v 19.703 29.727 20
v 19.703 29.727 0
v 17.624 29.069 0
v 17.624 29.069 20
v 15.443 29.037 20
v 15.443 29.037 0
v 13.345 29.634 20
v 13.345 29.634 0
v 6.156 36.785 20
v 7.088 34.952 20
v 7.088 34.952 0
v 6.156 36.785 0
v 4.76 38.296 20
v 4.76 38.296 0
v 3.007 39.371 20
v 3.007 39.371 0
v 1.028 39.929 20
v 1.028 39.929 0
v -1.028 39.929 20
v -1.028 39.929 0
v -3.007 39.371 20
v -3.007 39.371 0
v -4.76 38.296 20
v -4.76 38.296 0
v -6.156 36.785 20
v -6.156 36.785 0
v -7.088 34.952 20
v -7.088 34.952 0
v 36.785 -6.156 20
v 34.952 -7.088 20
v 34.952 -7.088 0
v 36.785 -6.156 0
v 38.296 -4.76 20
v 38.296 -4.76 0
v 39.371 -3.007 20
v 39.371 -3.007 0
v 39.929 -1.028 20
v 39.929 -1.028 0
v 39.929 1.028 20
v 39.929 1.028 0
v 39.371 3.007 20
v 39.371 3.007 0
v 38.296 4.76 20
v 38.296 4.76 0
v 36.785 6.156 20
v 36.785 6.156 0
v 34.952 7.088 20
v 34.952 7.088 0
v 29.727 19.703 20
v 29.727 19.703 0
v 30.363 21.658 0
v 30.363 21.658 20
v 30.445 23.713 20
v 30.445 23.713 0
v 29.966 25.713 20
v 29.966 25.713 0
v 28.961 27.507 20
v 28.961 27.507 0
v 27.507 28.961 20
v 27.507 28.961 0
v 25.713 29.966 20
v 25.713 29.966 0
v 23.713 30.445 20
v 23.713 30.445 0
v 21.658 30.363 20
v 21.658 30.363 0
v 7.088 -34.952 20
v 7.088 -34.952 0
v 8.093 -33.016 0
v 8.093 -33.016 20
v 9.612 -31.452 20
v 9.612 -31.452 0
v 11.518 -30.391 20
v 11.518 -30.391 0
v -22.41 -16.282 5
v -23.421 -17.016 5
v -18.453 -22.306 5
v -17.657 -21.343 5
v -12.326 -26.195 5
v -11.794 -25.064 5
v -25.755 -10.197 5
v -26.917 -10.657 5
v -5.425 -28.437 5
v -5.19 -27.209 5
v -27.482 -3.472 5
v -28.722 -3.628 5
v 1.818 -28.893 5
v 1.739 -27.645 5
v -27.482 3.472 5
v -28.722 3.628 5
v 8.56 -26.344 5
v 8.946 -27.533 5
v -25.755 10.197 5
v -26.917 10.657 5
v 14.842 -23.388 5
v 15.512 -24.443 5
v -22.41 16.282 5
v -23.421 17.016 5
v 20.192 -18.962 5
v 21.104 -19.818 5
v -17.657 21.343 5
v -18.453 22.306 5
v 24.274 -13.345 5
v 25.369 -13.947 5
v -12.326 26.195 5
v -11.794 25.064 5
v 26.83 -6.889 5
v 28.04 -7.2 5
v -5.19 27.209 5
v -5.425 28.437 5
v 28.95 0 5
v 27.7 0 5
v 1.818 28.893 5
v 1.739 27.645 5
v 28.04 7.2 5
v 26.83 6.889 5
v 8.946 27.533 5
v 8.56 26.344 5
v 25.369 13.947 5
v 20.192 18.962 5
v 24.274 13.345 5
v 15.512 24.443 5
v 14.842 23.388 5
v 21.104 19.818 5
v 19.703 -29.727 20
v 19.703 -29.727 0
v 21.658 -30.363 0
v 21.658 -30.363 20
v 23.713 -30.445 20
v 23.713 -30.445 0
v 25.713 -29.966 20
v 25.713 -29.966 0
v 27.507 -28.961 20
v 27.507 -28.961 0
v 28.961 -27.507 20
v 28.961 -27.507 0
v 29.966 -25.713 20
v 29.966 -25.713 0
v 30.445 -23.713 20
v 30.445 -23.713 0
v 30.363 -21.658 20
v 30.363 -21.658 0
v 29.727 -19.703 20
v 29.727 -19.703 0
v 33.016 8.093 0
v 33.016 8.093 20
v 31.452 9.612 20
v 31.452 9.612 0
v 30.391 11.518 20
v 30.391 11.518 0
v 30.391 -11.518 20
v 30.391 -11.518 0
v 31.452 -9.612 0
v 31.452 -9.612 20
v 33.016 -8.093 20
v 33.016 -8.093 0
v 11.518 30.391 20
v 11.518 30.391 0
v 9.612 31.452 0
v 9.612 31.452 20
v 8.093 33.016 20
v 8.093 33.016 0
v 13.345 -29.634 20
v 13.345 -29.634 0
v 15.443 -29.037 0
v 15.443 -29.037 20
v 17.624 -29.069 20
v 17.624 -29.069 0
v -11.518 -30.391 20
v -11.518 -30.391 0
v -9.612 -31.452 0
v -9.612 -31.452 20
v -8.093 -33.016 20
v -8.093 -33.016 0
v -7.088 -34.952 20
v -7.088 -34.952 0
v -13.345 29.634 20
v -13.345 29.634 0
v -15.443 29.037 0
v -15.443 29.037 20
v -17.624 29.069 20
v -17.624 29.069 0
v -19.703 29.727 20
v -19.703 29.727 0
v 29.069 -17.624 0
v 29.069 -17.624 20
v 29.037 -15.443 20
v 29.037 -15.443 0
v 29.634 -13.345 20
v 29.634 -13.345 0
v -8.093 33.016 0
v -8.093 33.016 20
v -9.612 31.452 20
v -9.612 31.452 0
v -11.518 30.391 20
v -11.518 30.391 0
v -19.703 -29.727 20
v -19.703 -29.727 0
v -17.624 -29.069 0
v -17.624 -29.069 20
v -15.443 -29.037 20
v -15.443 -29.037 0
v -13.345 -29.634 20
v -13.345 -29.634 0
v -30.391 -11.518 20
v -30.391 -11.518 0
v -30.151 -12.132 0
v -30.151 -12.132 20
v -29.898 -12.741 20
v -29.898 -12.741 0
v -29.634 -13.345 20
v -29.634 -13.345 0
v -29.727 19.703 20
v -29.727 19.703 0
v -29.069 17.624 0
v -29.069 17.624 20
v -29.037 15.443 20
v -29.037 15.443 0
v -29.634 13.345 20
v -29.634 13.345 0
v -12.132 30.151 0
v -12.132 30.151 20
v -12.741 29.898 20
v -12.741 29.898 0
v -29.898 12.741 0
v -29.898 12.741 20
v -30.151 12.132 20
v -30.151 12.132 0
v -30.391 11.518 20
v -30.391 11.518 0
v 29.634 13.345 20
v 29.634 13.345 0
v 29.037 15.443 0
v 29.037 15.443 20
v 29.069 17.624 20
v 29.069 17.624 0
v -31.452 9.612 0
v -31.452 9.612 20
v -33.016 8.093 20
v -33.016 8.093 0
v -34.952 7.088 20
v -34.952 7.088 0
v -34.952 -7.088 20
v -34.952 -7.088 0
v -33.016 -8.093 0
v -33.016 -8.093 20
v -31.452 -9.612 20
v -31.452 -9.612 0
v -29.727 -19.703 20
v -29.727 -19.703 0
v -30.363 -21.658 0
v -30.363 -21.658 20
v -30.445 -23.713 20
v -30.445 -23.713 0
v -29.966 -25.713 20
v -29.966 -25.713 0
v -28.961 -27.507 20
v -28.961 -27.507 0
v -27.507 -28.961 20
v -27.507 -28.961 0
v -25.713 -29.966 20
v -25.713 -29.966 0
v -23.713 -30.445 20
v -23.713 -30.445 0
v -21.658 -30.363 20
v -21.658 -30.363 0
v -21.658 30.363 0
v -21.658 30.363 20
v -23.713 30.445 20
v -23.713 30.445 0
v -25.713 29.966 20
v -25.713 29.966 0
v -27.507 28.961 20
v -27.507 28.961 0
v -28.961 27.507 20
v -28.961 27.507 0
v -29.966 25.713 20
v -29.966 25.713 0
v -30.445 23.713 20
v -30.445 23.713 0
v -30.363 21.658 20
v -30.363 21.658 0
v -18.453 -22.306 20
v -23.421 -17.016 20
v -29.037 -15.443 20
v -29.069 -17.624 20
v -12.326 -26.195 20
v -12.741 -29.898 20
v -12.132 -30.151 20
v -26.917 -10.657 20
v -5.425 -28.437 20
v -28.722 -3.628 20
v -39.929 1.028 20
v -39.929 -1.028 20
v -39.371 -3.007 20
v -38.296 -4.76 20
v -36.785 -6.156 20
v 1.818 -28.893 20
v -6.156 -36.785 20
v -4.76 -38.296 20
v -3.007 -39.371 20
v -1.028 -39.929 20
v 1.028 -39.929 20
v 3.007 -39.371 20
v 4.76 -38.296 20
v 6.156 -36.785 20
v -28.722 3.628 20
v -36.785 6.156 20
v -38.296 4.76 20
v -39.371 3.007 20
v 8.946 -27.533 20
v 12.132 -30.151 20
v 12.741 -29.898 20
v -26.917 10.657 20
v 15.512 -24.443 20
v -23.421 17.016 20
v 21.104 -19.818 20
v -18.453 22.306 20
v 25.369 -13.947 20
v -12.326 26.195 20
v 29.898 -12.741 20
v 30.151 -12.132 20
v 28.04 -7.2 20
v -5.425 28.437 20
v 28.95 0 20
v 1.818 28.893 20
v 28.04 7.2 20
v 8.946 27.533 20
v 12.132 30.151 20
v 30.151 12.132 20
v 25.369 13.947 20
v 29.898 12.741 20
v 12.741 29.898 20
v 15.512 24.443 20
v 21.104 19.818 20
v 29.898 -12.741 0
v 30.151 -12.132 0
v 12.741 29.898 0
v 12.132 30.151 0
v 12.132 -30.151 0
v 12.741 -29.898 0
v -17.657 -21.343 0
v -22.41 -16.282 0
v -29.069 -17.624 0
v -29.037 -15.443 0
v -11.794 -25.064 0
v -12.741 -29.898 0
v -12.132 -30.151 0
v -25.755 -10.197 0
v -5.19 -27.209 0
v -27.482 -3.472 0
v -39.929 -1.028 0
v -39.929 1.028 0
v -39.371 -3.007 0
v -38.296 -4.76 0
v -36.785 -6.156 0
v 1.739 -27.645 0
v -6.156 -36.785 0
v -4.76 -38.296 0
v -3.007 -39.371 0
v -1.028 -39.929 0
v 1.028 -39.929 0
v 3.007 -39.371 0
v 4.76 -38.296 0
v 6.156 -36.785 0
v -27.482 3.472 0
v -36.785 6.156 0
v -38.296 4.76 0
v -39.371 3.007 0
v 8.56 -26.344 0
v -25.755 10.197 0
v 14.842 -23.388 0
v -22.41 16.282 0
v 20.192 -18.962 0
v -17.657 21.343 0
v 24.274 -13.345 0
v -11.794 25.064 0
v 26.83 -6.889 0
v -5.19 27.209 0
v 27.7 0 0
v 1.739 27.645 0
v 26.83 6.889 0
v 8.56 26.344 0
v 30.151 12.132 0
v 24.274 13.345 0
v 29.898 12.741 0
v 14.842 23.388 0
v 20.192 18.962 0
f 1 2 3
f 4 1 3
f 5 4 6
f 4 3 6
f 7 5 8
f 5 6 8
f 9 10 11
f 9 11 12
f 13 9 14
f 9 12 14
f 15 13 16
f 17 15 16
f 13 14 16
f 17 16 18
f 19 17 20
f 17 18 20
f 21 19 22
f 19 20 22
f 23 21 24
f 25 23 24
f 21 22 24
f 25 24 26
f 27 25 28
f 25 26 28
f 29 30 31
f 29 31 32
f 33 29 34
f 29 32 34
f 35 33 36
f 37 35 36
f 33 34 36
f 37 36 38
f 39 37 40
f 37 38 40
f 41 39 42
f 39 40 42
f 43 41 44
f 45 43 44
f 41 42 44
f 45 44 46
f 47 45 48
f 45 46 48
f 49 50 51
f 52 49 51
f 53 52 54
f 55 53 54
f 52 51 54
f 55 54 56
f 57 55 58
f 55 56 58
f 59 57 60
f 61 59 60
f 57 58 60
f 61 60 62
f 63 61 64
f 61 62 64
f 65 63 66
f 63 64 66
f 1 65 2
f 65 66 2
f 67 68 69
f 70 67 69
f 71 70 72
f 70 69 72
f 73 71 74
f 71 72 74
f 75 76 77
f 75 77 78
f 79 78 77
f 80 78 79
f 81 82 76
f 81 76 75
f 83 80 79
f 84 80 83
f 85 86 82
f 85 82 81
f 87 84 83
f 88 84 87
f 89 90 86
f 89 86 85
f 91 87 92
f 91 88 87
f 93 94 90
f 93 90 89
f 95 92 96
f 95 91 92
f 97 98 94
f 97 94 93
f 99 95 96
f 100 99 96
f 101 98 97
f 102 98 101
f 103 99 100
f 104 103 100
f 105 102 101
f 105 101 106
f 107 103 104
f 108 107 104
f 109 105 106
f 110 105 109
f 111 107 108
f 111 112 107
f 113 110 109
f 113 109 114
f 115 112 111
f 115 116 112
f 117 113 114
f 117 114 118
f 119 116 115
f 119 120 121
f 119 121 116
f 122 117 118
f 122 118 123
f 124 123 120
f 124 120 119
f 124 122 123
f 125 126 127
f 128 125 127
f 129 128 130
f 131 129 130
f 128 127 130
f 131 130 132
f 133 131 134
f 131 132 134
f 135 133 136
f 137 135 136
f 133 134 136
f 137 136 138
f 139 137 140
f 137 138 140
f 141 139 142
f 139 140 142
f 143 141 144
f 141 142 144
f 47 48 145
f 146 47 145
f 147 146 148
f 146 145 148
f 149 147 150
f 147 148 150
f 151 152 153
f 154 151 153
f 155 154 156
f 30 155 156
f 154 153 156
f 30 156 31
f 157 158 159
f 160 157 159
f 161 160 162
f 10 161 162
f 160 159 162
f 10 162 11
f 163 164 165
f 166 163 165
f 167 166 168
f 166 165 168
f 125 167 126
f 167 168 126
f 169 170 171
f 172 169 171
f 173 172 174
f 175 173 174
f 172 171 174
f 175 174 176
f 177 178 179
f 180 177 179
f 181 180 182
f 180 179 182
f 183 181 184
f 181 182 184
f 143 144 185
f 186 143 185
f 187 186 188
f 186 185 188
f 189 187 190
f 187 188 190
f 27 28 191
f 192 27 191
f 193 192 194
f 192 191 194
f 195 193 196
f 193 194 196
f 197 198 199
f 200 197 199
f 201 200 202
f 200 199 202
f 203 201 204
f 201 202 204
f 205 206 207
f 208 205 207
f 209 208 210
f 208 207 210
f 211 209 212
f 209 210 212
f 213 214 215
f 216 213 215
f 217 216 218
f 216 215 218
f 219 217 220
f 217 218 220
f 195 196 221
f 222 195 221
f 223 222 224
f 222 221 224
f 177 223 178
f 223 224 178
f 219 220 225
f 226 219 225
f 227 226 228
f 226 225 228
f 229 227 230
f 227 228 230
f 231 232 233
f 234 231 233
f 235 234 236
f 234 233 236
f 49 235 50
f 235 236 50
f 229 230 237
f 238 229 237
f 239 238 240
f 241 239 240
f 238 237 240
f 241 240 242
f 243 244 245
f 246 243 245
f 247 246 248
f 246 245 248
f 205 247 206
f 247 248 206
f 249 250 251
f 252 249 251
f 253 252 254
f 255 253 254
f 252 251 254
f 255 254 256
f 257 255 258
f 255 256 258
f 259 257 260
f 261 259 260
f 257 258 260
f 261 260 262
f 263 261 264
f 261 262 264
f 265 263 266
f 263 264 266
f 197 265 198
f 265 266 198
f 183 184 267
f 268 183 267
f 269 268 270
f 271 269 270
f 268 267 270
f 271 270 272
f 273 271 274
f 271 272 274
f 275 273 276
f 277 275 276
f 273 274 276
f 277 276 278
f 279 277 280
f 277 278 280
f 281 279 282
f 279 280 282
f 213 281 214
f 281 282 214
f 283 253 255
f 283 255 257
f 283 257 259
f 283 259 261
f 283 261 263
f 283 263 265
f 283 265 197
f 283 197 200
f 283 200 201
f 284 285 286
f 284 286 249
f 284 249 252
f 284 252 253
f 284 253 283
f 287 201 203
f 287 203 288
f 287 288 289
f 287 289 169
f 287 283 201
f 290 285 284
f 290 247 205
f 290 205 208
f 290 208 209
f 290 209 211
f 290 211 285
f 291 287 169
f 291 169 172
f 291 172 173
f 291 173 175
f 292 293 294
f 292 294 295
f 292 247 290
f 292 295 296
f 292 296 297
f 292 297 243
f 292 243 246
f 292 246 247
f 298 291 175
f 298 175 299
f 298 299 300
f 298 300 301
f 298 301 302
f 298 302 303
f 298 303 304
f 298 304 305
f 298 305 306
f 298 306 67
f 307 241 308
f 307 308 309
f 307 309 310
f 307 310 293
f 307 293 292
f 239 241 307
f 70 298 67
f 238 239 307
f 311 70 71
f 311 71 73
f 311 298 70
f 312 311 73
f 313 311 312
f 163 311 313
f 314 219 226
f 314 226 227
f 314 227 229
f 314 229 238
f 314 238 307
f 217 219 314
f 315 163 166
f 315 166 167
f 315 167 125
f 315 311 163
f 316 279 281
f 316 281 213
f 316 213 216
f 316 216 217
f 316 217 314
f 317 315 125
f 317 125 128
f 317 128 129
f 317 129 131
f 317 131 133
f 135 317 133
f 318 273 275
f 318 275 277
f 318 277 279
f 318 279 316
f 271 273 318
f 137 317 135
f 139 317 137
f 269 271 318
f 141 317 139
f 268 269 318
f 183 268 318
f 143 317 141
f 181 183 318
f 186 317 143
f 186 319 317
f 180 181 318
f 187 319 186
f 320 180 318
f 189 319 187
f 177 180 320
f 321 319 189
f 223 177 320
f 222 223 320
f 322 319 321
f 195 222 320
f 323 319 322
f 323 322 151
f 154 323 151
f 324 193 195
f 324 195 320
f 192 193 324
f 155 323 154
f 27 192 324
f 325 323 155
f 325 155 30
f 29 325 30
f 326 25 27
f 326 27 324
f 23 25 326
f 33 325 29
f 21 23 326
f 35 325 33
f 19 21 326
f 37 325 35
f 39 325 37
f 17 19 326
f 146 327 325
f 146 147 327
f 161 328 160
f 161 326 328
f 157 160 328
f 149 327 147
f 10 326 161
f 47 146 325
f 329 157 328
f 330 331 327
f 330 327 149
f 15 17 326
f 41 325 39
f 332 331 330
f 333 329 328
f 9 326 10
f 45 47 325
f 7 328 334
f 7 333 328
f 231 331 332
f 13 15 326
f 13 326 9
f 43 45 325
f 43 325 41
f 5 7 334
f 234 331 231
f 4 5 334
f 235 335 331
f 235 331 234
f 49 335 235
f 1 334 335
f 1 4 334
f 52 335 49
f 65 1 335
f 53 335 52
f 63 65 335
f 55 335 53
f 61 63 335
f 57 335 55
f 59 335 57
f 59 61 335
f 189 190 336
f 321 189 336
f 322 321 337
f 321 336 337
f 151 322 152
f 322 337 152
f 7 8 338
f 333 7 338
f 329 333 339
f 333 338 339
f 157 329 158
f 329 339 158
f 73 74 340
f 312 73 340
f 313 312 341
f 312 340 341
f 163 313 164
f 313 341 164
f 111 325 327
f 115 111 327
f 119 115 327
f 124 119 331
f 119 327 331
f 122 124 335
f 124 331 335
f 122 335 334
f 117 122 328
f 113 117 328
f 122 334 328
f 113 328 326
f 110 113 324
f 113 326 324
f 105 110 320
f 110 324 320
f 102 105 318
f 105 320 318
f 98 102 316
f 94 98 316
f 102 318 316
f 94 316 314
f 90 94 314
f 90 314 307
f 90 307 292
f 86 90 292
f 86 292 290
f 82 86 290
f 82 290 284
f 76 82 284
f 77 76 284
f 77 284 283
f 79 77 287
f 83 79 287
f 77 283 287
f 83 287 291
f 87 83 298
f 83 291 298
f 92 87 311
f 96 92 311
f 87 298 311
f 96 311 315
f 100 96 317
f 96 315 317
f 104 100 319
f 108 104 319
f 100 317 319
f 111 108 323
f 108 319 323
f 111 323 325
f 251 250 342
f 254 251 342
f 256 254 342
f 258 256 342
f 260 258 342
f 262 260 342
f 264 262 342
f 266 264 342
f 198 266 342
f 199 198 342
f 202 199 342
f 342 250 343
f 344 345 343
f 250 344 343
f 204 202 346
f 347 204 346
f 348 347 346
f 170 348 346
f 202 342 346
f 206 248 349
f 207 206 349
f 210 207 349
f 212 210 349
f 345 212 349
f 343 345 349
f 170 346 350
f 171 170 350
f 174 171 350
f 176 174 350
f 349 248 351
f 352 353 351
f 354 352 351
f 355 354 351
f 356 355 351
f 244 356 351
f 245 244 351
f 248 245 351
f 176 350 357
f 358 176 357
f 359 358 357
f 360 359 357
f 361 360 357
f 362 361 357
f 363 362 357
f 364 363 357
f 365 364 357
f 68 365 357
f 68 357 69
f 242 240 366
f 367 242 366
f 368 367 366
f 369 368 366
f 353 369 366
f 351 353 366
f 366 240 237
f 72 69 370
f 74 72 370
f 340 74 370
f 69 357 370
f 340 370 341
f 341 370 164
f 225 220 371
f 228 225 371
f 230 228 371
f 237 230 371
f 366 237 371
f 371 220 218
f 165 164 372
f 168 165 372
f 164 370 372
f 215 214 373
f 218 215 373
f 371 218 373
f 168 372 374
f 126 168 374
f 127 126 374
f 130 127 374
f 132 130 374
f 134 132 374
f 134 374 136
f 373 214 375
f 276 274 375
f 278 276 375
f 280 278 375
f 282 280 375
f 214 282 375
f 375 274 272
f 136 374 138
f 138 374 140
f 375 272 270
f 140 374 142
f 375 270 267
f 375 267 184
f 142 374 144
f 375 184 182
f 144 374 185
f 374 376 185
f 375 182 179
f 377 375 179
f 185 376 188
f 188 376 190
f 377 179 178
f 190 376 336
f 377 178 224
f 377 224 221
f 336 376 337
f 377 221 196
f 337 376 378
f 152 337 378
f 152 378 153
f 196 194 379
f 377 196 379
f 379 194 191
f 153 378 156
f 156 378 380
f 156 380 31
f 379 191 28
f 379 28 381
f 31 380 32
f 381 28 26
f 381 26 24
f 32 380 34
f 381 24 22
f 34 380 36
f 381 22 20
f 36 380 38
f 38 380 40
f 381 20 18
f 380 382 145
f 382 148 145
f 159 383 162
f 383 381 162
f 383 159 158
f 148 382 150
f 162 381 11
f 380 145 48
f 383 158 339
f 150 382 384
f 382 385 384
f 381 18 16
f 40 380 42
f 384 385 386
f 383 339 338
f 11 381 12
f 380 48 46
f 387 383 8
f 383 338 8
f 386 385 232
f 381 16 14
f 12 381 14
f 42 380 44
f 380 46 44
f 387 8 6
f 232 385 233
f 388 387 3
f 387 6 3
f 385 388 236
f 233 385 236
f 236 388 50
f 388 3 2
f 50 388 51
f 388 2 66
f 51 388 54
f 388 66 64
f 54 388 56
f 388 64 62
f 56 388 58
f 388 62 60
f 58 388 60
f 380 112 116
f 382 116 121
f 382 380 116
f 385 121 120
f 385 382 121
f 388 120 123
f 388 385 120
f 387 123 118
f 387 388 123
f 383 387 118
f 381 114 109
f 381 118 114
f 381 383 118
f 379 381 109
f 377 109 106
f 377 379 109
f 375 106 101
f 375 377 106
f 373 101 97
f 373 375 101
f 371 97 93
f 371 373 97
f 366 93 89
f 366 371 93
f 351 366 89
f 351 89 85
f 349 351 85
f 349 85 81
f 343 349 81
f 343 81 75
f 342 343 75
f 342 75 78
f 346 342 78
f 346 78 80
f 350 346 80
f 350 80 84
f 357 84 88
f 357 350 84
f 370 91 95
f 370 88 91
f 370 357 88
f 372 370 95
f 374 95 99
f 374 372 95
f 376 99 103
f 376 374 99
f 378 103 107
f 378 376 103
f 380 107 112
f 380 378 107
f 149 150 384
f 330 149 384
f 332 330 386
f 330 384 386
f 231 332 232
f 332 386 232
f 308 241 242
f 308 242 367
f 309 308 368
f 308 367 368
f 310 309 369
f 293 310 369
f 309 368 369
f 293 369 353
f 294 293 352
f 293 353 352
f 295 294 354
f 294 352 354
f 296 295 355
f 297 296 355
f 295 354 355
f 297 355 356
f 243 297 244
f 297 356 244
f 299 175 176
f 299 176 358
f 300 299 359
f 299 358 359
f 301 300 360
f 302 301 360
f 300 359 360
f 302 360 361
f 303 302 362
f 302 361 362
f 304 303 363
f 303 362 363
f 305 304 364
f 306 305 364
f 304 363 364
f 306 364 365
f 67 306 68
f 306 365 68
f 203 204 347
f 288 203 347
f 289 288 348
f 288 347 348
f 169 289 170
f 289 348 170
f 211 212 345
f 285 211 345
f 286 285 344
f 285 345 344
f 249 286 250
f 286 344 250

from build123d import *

# Parameters (mm, degrees)
F0_R     = 27.7
F1_DEPTH = 20
F2_R     = 28.95
F3_DEPTH = 15


with BuildPart() as f1:
    # F0 (on Top) → F1 (new body)
    with BuildSketch(Plane.XY):
        with BuildLine():
            ThreePointArc((-7.087882, 34.951923), (-8.795551, 32.17859), (-11.517808, 30.390625))
            ThreePointArc((-11.517808, 30.390625), (-12.437212, 30.026085), (-13.345097, 29.633738))
            ThreePointArc((-13.345097, 29.633738), (-16.534306, 28.973093), (-19.702852, 29.726631))
            ThreePointArc((-19.702852, 29.726631), (-28.284271, 28.284271), (-29.726631, 19.702852))
            ThreePointArc((-29.726631, 19.702852), (-28.973093, 16.534306), (-29.633738, 13.345097))
            ThreePointArc((-29.633738, 13.345097), (-30.026085, 12.437212), (-30.390625, 11.517808))
            ThreePointArc((-30.390625, 11.517808), (-32.17859, 8.795551), (-34.951923, 7.087882))
            ThreePointArc((-34.951923, 7.087882), (-40, 0), (-34.951923, -7.087882))
            ThreePointArc((-34.951923, -7.087882), (-32.17859, -8.795551), (-30.390625, -11.517808))
            ThreePointArc((-30.390625, -11.517808), (-30.026085, -12.437212), (-29.633738, -13.345097))
            ThreePointArc((-29.633738, -13.345097), (-28.973093, -16.534306), (-29.726631, -19.702852))
            ThreePointArc((-29.726631, -19.702852), (-28.284271, -28.284271), (-19.702852, -29.726631))
            ThreePointArc((-19.702852, -29.726631), (-16.534306, -28.973093), (-13.345097, -29.633738))
            ThreePointArc((-13.345097, -29.633738), (-12.437212, -30.026085), (-11.517808, -30.390625))
            ThreePointArc((-11.517808, -30.390625), (-8.795551, -32.17859), (-7.087882, -34.951923))
            ThreePointArc((-7.087882, -34.951923), (0, -40), (7.087882, -34.951923))
            ThreePointArc((7.087882, -34.951923), (8.795551, -32.17859), (11.517808, -30.390625))
            ThreePointArc((11.517808, -30.390625), (12.437212, -30.026085), (13.345097, -29.633738))
            ThreePointArc((13.345097, -29.633738), (16.534306, -28.973093), (19.702852, -29.726631))
            ThreePointArc((19.702852, -29.726631), (28.284271, -28.284271), (29.726631, -19.702852))
            ThreePointArc((29.726631, -19.702852), (28.973093, -16.534306), (29.633738, -13.345097))
            ThreePointArc((29.633738, -13.345097), (30.026085, -12.437212), (30.390625, -11.517808))
            ThreePointArc((30.390625, -11.517808), (32.17859, -8.795551), (34.951923, -7.087882))
            ThreePointArc((34.951923, -7.087882), (40, 0), (34.951923, 7.087882))
            ThreePointArc((34.951923, 7.087882), (32.17859, 8.795551), (30.390625, 11.517808))
            ThreePointArc((30.390625, 11.517808), (30.026085, 12.437212), (29.633738, 13.345097))
            ThreePointArc((29.633738, 13.345097), (28.973093, 16.534306), (29.726631, 19.702852))
            ThreePointArc((29.726631, 19.702852), (28.284271, 28.284271), (19.702852, 29.726631))
            ThreePointArc((19.702852, 29.726631), (16.534306, 28.973093), (13.345097, 29.633738))
            ThreePointArc((13.345097, 29.633738), (12.437212, 30.026085), (11.517808, 30.390625))
            ThreePointArc((11.517808, 30.390625), (8.795551, 32.17859), (7.087882, 34.951923))
            ThreePointArc((7.087882, 34.951923), (0, 40), (-7.087882, 34.951923))
        make_face()
        Circle(F0_R, mode=Mode.SUBTRACT)
    extrude(amount=F1_DEPTH)

    # F2 (on face) → F3 (cut)
    with BuildSketch(Plane.XY.offset(20)):
        Circle(F2_R)
    extrude(amount=-F3_DEPTH, mode=Mode.SUBTRACT)


solid = f1.part
